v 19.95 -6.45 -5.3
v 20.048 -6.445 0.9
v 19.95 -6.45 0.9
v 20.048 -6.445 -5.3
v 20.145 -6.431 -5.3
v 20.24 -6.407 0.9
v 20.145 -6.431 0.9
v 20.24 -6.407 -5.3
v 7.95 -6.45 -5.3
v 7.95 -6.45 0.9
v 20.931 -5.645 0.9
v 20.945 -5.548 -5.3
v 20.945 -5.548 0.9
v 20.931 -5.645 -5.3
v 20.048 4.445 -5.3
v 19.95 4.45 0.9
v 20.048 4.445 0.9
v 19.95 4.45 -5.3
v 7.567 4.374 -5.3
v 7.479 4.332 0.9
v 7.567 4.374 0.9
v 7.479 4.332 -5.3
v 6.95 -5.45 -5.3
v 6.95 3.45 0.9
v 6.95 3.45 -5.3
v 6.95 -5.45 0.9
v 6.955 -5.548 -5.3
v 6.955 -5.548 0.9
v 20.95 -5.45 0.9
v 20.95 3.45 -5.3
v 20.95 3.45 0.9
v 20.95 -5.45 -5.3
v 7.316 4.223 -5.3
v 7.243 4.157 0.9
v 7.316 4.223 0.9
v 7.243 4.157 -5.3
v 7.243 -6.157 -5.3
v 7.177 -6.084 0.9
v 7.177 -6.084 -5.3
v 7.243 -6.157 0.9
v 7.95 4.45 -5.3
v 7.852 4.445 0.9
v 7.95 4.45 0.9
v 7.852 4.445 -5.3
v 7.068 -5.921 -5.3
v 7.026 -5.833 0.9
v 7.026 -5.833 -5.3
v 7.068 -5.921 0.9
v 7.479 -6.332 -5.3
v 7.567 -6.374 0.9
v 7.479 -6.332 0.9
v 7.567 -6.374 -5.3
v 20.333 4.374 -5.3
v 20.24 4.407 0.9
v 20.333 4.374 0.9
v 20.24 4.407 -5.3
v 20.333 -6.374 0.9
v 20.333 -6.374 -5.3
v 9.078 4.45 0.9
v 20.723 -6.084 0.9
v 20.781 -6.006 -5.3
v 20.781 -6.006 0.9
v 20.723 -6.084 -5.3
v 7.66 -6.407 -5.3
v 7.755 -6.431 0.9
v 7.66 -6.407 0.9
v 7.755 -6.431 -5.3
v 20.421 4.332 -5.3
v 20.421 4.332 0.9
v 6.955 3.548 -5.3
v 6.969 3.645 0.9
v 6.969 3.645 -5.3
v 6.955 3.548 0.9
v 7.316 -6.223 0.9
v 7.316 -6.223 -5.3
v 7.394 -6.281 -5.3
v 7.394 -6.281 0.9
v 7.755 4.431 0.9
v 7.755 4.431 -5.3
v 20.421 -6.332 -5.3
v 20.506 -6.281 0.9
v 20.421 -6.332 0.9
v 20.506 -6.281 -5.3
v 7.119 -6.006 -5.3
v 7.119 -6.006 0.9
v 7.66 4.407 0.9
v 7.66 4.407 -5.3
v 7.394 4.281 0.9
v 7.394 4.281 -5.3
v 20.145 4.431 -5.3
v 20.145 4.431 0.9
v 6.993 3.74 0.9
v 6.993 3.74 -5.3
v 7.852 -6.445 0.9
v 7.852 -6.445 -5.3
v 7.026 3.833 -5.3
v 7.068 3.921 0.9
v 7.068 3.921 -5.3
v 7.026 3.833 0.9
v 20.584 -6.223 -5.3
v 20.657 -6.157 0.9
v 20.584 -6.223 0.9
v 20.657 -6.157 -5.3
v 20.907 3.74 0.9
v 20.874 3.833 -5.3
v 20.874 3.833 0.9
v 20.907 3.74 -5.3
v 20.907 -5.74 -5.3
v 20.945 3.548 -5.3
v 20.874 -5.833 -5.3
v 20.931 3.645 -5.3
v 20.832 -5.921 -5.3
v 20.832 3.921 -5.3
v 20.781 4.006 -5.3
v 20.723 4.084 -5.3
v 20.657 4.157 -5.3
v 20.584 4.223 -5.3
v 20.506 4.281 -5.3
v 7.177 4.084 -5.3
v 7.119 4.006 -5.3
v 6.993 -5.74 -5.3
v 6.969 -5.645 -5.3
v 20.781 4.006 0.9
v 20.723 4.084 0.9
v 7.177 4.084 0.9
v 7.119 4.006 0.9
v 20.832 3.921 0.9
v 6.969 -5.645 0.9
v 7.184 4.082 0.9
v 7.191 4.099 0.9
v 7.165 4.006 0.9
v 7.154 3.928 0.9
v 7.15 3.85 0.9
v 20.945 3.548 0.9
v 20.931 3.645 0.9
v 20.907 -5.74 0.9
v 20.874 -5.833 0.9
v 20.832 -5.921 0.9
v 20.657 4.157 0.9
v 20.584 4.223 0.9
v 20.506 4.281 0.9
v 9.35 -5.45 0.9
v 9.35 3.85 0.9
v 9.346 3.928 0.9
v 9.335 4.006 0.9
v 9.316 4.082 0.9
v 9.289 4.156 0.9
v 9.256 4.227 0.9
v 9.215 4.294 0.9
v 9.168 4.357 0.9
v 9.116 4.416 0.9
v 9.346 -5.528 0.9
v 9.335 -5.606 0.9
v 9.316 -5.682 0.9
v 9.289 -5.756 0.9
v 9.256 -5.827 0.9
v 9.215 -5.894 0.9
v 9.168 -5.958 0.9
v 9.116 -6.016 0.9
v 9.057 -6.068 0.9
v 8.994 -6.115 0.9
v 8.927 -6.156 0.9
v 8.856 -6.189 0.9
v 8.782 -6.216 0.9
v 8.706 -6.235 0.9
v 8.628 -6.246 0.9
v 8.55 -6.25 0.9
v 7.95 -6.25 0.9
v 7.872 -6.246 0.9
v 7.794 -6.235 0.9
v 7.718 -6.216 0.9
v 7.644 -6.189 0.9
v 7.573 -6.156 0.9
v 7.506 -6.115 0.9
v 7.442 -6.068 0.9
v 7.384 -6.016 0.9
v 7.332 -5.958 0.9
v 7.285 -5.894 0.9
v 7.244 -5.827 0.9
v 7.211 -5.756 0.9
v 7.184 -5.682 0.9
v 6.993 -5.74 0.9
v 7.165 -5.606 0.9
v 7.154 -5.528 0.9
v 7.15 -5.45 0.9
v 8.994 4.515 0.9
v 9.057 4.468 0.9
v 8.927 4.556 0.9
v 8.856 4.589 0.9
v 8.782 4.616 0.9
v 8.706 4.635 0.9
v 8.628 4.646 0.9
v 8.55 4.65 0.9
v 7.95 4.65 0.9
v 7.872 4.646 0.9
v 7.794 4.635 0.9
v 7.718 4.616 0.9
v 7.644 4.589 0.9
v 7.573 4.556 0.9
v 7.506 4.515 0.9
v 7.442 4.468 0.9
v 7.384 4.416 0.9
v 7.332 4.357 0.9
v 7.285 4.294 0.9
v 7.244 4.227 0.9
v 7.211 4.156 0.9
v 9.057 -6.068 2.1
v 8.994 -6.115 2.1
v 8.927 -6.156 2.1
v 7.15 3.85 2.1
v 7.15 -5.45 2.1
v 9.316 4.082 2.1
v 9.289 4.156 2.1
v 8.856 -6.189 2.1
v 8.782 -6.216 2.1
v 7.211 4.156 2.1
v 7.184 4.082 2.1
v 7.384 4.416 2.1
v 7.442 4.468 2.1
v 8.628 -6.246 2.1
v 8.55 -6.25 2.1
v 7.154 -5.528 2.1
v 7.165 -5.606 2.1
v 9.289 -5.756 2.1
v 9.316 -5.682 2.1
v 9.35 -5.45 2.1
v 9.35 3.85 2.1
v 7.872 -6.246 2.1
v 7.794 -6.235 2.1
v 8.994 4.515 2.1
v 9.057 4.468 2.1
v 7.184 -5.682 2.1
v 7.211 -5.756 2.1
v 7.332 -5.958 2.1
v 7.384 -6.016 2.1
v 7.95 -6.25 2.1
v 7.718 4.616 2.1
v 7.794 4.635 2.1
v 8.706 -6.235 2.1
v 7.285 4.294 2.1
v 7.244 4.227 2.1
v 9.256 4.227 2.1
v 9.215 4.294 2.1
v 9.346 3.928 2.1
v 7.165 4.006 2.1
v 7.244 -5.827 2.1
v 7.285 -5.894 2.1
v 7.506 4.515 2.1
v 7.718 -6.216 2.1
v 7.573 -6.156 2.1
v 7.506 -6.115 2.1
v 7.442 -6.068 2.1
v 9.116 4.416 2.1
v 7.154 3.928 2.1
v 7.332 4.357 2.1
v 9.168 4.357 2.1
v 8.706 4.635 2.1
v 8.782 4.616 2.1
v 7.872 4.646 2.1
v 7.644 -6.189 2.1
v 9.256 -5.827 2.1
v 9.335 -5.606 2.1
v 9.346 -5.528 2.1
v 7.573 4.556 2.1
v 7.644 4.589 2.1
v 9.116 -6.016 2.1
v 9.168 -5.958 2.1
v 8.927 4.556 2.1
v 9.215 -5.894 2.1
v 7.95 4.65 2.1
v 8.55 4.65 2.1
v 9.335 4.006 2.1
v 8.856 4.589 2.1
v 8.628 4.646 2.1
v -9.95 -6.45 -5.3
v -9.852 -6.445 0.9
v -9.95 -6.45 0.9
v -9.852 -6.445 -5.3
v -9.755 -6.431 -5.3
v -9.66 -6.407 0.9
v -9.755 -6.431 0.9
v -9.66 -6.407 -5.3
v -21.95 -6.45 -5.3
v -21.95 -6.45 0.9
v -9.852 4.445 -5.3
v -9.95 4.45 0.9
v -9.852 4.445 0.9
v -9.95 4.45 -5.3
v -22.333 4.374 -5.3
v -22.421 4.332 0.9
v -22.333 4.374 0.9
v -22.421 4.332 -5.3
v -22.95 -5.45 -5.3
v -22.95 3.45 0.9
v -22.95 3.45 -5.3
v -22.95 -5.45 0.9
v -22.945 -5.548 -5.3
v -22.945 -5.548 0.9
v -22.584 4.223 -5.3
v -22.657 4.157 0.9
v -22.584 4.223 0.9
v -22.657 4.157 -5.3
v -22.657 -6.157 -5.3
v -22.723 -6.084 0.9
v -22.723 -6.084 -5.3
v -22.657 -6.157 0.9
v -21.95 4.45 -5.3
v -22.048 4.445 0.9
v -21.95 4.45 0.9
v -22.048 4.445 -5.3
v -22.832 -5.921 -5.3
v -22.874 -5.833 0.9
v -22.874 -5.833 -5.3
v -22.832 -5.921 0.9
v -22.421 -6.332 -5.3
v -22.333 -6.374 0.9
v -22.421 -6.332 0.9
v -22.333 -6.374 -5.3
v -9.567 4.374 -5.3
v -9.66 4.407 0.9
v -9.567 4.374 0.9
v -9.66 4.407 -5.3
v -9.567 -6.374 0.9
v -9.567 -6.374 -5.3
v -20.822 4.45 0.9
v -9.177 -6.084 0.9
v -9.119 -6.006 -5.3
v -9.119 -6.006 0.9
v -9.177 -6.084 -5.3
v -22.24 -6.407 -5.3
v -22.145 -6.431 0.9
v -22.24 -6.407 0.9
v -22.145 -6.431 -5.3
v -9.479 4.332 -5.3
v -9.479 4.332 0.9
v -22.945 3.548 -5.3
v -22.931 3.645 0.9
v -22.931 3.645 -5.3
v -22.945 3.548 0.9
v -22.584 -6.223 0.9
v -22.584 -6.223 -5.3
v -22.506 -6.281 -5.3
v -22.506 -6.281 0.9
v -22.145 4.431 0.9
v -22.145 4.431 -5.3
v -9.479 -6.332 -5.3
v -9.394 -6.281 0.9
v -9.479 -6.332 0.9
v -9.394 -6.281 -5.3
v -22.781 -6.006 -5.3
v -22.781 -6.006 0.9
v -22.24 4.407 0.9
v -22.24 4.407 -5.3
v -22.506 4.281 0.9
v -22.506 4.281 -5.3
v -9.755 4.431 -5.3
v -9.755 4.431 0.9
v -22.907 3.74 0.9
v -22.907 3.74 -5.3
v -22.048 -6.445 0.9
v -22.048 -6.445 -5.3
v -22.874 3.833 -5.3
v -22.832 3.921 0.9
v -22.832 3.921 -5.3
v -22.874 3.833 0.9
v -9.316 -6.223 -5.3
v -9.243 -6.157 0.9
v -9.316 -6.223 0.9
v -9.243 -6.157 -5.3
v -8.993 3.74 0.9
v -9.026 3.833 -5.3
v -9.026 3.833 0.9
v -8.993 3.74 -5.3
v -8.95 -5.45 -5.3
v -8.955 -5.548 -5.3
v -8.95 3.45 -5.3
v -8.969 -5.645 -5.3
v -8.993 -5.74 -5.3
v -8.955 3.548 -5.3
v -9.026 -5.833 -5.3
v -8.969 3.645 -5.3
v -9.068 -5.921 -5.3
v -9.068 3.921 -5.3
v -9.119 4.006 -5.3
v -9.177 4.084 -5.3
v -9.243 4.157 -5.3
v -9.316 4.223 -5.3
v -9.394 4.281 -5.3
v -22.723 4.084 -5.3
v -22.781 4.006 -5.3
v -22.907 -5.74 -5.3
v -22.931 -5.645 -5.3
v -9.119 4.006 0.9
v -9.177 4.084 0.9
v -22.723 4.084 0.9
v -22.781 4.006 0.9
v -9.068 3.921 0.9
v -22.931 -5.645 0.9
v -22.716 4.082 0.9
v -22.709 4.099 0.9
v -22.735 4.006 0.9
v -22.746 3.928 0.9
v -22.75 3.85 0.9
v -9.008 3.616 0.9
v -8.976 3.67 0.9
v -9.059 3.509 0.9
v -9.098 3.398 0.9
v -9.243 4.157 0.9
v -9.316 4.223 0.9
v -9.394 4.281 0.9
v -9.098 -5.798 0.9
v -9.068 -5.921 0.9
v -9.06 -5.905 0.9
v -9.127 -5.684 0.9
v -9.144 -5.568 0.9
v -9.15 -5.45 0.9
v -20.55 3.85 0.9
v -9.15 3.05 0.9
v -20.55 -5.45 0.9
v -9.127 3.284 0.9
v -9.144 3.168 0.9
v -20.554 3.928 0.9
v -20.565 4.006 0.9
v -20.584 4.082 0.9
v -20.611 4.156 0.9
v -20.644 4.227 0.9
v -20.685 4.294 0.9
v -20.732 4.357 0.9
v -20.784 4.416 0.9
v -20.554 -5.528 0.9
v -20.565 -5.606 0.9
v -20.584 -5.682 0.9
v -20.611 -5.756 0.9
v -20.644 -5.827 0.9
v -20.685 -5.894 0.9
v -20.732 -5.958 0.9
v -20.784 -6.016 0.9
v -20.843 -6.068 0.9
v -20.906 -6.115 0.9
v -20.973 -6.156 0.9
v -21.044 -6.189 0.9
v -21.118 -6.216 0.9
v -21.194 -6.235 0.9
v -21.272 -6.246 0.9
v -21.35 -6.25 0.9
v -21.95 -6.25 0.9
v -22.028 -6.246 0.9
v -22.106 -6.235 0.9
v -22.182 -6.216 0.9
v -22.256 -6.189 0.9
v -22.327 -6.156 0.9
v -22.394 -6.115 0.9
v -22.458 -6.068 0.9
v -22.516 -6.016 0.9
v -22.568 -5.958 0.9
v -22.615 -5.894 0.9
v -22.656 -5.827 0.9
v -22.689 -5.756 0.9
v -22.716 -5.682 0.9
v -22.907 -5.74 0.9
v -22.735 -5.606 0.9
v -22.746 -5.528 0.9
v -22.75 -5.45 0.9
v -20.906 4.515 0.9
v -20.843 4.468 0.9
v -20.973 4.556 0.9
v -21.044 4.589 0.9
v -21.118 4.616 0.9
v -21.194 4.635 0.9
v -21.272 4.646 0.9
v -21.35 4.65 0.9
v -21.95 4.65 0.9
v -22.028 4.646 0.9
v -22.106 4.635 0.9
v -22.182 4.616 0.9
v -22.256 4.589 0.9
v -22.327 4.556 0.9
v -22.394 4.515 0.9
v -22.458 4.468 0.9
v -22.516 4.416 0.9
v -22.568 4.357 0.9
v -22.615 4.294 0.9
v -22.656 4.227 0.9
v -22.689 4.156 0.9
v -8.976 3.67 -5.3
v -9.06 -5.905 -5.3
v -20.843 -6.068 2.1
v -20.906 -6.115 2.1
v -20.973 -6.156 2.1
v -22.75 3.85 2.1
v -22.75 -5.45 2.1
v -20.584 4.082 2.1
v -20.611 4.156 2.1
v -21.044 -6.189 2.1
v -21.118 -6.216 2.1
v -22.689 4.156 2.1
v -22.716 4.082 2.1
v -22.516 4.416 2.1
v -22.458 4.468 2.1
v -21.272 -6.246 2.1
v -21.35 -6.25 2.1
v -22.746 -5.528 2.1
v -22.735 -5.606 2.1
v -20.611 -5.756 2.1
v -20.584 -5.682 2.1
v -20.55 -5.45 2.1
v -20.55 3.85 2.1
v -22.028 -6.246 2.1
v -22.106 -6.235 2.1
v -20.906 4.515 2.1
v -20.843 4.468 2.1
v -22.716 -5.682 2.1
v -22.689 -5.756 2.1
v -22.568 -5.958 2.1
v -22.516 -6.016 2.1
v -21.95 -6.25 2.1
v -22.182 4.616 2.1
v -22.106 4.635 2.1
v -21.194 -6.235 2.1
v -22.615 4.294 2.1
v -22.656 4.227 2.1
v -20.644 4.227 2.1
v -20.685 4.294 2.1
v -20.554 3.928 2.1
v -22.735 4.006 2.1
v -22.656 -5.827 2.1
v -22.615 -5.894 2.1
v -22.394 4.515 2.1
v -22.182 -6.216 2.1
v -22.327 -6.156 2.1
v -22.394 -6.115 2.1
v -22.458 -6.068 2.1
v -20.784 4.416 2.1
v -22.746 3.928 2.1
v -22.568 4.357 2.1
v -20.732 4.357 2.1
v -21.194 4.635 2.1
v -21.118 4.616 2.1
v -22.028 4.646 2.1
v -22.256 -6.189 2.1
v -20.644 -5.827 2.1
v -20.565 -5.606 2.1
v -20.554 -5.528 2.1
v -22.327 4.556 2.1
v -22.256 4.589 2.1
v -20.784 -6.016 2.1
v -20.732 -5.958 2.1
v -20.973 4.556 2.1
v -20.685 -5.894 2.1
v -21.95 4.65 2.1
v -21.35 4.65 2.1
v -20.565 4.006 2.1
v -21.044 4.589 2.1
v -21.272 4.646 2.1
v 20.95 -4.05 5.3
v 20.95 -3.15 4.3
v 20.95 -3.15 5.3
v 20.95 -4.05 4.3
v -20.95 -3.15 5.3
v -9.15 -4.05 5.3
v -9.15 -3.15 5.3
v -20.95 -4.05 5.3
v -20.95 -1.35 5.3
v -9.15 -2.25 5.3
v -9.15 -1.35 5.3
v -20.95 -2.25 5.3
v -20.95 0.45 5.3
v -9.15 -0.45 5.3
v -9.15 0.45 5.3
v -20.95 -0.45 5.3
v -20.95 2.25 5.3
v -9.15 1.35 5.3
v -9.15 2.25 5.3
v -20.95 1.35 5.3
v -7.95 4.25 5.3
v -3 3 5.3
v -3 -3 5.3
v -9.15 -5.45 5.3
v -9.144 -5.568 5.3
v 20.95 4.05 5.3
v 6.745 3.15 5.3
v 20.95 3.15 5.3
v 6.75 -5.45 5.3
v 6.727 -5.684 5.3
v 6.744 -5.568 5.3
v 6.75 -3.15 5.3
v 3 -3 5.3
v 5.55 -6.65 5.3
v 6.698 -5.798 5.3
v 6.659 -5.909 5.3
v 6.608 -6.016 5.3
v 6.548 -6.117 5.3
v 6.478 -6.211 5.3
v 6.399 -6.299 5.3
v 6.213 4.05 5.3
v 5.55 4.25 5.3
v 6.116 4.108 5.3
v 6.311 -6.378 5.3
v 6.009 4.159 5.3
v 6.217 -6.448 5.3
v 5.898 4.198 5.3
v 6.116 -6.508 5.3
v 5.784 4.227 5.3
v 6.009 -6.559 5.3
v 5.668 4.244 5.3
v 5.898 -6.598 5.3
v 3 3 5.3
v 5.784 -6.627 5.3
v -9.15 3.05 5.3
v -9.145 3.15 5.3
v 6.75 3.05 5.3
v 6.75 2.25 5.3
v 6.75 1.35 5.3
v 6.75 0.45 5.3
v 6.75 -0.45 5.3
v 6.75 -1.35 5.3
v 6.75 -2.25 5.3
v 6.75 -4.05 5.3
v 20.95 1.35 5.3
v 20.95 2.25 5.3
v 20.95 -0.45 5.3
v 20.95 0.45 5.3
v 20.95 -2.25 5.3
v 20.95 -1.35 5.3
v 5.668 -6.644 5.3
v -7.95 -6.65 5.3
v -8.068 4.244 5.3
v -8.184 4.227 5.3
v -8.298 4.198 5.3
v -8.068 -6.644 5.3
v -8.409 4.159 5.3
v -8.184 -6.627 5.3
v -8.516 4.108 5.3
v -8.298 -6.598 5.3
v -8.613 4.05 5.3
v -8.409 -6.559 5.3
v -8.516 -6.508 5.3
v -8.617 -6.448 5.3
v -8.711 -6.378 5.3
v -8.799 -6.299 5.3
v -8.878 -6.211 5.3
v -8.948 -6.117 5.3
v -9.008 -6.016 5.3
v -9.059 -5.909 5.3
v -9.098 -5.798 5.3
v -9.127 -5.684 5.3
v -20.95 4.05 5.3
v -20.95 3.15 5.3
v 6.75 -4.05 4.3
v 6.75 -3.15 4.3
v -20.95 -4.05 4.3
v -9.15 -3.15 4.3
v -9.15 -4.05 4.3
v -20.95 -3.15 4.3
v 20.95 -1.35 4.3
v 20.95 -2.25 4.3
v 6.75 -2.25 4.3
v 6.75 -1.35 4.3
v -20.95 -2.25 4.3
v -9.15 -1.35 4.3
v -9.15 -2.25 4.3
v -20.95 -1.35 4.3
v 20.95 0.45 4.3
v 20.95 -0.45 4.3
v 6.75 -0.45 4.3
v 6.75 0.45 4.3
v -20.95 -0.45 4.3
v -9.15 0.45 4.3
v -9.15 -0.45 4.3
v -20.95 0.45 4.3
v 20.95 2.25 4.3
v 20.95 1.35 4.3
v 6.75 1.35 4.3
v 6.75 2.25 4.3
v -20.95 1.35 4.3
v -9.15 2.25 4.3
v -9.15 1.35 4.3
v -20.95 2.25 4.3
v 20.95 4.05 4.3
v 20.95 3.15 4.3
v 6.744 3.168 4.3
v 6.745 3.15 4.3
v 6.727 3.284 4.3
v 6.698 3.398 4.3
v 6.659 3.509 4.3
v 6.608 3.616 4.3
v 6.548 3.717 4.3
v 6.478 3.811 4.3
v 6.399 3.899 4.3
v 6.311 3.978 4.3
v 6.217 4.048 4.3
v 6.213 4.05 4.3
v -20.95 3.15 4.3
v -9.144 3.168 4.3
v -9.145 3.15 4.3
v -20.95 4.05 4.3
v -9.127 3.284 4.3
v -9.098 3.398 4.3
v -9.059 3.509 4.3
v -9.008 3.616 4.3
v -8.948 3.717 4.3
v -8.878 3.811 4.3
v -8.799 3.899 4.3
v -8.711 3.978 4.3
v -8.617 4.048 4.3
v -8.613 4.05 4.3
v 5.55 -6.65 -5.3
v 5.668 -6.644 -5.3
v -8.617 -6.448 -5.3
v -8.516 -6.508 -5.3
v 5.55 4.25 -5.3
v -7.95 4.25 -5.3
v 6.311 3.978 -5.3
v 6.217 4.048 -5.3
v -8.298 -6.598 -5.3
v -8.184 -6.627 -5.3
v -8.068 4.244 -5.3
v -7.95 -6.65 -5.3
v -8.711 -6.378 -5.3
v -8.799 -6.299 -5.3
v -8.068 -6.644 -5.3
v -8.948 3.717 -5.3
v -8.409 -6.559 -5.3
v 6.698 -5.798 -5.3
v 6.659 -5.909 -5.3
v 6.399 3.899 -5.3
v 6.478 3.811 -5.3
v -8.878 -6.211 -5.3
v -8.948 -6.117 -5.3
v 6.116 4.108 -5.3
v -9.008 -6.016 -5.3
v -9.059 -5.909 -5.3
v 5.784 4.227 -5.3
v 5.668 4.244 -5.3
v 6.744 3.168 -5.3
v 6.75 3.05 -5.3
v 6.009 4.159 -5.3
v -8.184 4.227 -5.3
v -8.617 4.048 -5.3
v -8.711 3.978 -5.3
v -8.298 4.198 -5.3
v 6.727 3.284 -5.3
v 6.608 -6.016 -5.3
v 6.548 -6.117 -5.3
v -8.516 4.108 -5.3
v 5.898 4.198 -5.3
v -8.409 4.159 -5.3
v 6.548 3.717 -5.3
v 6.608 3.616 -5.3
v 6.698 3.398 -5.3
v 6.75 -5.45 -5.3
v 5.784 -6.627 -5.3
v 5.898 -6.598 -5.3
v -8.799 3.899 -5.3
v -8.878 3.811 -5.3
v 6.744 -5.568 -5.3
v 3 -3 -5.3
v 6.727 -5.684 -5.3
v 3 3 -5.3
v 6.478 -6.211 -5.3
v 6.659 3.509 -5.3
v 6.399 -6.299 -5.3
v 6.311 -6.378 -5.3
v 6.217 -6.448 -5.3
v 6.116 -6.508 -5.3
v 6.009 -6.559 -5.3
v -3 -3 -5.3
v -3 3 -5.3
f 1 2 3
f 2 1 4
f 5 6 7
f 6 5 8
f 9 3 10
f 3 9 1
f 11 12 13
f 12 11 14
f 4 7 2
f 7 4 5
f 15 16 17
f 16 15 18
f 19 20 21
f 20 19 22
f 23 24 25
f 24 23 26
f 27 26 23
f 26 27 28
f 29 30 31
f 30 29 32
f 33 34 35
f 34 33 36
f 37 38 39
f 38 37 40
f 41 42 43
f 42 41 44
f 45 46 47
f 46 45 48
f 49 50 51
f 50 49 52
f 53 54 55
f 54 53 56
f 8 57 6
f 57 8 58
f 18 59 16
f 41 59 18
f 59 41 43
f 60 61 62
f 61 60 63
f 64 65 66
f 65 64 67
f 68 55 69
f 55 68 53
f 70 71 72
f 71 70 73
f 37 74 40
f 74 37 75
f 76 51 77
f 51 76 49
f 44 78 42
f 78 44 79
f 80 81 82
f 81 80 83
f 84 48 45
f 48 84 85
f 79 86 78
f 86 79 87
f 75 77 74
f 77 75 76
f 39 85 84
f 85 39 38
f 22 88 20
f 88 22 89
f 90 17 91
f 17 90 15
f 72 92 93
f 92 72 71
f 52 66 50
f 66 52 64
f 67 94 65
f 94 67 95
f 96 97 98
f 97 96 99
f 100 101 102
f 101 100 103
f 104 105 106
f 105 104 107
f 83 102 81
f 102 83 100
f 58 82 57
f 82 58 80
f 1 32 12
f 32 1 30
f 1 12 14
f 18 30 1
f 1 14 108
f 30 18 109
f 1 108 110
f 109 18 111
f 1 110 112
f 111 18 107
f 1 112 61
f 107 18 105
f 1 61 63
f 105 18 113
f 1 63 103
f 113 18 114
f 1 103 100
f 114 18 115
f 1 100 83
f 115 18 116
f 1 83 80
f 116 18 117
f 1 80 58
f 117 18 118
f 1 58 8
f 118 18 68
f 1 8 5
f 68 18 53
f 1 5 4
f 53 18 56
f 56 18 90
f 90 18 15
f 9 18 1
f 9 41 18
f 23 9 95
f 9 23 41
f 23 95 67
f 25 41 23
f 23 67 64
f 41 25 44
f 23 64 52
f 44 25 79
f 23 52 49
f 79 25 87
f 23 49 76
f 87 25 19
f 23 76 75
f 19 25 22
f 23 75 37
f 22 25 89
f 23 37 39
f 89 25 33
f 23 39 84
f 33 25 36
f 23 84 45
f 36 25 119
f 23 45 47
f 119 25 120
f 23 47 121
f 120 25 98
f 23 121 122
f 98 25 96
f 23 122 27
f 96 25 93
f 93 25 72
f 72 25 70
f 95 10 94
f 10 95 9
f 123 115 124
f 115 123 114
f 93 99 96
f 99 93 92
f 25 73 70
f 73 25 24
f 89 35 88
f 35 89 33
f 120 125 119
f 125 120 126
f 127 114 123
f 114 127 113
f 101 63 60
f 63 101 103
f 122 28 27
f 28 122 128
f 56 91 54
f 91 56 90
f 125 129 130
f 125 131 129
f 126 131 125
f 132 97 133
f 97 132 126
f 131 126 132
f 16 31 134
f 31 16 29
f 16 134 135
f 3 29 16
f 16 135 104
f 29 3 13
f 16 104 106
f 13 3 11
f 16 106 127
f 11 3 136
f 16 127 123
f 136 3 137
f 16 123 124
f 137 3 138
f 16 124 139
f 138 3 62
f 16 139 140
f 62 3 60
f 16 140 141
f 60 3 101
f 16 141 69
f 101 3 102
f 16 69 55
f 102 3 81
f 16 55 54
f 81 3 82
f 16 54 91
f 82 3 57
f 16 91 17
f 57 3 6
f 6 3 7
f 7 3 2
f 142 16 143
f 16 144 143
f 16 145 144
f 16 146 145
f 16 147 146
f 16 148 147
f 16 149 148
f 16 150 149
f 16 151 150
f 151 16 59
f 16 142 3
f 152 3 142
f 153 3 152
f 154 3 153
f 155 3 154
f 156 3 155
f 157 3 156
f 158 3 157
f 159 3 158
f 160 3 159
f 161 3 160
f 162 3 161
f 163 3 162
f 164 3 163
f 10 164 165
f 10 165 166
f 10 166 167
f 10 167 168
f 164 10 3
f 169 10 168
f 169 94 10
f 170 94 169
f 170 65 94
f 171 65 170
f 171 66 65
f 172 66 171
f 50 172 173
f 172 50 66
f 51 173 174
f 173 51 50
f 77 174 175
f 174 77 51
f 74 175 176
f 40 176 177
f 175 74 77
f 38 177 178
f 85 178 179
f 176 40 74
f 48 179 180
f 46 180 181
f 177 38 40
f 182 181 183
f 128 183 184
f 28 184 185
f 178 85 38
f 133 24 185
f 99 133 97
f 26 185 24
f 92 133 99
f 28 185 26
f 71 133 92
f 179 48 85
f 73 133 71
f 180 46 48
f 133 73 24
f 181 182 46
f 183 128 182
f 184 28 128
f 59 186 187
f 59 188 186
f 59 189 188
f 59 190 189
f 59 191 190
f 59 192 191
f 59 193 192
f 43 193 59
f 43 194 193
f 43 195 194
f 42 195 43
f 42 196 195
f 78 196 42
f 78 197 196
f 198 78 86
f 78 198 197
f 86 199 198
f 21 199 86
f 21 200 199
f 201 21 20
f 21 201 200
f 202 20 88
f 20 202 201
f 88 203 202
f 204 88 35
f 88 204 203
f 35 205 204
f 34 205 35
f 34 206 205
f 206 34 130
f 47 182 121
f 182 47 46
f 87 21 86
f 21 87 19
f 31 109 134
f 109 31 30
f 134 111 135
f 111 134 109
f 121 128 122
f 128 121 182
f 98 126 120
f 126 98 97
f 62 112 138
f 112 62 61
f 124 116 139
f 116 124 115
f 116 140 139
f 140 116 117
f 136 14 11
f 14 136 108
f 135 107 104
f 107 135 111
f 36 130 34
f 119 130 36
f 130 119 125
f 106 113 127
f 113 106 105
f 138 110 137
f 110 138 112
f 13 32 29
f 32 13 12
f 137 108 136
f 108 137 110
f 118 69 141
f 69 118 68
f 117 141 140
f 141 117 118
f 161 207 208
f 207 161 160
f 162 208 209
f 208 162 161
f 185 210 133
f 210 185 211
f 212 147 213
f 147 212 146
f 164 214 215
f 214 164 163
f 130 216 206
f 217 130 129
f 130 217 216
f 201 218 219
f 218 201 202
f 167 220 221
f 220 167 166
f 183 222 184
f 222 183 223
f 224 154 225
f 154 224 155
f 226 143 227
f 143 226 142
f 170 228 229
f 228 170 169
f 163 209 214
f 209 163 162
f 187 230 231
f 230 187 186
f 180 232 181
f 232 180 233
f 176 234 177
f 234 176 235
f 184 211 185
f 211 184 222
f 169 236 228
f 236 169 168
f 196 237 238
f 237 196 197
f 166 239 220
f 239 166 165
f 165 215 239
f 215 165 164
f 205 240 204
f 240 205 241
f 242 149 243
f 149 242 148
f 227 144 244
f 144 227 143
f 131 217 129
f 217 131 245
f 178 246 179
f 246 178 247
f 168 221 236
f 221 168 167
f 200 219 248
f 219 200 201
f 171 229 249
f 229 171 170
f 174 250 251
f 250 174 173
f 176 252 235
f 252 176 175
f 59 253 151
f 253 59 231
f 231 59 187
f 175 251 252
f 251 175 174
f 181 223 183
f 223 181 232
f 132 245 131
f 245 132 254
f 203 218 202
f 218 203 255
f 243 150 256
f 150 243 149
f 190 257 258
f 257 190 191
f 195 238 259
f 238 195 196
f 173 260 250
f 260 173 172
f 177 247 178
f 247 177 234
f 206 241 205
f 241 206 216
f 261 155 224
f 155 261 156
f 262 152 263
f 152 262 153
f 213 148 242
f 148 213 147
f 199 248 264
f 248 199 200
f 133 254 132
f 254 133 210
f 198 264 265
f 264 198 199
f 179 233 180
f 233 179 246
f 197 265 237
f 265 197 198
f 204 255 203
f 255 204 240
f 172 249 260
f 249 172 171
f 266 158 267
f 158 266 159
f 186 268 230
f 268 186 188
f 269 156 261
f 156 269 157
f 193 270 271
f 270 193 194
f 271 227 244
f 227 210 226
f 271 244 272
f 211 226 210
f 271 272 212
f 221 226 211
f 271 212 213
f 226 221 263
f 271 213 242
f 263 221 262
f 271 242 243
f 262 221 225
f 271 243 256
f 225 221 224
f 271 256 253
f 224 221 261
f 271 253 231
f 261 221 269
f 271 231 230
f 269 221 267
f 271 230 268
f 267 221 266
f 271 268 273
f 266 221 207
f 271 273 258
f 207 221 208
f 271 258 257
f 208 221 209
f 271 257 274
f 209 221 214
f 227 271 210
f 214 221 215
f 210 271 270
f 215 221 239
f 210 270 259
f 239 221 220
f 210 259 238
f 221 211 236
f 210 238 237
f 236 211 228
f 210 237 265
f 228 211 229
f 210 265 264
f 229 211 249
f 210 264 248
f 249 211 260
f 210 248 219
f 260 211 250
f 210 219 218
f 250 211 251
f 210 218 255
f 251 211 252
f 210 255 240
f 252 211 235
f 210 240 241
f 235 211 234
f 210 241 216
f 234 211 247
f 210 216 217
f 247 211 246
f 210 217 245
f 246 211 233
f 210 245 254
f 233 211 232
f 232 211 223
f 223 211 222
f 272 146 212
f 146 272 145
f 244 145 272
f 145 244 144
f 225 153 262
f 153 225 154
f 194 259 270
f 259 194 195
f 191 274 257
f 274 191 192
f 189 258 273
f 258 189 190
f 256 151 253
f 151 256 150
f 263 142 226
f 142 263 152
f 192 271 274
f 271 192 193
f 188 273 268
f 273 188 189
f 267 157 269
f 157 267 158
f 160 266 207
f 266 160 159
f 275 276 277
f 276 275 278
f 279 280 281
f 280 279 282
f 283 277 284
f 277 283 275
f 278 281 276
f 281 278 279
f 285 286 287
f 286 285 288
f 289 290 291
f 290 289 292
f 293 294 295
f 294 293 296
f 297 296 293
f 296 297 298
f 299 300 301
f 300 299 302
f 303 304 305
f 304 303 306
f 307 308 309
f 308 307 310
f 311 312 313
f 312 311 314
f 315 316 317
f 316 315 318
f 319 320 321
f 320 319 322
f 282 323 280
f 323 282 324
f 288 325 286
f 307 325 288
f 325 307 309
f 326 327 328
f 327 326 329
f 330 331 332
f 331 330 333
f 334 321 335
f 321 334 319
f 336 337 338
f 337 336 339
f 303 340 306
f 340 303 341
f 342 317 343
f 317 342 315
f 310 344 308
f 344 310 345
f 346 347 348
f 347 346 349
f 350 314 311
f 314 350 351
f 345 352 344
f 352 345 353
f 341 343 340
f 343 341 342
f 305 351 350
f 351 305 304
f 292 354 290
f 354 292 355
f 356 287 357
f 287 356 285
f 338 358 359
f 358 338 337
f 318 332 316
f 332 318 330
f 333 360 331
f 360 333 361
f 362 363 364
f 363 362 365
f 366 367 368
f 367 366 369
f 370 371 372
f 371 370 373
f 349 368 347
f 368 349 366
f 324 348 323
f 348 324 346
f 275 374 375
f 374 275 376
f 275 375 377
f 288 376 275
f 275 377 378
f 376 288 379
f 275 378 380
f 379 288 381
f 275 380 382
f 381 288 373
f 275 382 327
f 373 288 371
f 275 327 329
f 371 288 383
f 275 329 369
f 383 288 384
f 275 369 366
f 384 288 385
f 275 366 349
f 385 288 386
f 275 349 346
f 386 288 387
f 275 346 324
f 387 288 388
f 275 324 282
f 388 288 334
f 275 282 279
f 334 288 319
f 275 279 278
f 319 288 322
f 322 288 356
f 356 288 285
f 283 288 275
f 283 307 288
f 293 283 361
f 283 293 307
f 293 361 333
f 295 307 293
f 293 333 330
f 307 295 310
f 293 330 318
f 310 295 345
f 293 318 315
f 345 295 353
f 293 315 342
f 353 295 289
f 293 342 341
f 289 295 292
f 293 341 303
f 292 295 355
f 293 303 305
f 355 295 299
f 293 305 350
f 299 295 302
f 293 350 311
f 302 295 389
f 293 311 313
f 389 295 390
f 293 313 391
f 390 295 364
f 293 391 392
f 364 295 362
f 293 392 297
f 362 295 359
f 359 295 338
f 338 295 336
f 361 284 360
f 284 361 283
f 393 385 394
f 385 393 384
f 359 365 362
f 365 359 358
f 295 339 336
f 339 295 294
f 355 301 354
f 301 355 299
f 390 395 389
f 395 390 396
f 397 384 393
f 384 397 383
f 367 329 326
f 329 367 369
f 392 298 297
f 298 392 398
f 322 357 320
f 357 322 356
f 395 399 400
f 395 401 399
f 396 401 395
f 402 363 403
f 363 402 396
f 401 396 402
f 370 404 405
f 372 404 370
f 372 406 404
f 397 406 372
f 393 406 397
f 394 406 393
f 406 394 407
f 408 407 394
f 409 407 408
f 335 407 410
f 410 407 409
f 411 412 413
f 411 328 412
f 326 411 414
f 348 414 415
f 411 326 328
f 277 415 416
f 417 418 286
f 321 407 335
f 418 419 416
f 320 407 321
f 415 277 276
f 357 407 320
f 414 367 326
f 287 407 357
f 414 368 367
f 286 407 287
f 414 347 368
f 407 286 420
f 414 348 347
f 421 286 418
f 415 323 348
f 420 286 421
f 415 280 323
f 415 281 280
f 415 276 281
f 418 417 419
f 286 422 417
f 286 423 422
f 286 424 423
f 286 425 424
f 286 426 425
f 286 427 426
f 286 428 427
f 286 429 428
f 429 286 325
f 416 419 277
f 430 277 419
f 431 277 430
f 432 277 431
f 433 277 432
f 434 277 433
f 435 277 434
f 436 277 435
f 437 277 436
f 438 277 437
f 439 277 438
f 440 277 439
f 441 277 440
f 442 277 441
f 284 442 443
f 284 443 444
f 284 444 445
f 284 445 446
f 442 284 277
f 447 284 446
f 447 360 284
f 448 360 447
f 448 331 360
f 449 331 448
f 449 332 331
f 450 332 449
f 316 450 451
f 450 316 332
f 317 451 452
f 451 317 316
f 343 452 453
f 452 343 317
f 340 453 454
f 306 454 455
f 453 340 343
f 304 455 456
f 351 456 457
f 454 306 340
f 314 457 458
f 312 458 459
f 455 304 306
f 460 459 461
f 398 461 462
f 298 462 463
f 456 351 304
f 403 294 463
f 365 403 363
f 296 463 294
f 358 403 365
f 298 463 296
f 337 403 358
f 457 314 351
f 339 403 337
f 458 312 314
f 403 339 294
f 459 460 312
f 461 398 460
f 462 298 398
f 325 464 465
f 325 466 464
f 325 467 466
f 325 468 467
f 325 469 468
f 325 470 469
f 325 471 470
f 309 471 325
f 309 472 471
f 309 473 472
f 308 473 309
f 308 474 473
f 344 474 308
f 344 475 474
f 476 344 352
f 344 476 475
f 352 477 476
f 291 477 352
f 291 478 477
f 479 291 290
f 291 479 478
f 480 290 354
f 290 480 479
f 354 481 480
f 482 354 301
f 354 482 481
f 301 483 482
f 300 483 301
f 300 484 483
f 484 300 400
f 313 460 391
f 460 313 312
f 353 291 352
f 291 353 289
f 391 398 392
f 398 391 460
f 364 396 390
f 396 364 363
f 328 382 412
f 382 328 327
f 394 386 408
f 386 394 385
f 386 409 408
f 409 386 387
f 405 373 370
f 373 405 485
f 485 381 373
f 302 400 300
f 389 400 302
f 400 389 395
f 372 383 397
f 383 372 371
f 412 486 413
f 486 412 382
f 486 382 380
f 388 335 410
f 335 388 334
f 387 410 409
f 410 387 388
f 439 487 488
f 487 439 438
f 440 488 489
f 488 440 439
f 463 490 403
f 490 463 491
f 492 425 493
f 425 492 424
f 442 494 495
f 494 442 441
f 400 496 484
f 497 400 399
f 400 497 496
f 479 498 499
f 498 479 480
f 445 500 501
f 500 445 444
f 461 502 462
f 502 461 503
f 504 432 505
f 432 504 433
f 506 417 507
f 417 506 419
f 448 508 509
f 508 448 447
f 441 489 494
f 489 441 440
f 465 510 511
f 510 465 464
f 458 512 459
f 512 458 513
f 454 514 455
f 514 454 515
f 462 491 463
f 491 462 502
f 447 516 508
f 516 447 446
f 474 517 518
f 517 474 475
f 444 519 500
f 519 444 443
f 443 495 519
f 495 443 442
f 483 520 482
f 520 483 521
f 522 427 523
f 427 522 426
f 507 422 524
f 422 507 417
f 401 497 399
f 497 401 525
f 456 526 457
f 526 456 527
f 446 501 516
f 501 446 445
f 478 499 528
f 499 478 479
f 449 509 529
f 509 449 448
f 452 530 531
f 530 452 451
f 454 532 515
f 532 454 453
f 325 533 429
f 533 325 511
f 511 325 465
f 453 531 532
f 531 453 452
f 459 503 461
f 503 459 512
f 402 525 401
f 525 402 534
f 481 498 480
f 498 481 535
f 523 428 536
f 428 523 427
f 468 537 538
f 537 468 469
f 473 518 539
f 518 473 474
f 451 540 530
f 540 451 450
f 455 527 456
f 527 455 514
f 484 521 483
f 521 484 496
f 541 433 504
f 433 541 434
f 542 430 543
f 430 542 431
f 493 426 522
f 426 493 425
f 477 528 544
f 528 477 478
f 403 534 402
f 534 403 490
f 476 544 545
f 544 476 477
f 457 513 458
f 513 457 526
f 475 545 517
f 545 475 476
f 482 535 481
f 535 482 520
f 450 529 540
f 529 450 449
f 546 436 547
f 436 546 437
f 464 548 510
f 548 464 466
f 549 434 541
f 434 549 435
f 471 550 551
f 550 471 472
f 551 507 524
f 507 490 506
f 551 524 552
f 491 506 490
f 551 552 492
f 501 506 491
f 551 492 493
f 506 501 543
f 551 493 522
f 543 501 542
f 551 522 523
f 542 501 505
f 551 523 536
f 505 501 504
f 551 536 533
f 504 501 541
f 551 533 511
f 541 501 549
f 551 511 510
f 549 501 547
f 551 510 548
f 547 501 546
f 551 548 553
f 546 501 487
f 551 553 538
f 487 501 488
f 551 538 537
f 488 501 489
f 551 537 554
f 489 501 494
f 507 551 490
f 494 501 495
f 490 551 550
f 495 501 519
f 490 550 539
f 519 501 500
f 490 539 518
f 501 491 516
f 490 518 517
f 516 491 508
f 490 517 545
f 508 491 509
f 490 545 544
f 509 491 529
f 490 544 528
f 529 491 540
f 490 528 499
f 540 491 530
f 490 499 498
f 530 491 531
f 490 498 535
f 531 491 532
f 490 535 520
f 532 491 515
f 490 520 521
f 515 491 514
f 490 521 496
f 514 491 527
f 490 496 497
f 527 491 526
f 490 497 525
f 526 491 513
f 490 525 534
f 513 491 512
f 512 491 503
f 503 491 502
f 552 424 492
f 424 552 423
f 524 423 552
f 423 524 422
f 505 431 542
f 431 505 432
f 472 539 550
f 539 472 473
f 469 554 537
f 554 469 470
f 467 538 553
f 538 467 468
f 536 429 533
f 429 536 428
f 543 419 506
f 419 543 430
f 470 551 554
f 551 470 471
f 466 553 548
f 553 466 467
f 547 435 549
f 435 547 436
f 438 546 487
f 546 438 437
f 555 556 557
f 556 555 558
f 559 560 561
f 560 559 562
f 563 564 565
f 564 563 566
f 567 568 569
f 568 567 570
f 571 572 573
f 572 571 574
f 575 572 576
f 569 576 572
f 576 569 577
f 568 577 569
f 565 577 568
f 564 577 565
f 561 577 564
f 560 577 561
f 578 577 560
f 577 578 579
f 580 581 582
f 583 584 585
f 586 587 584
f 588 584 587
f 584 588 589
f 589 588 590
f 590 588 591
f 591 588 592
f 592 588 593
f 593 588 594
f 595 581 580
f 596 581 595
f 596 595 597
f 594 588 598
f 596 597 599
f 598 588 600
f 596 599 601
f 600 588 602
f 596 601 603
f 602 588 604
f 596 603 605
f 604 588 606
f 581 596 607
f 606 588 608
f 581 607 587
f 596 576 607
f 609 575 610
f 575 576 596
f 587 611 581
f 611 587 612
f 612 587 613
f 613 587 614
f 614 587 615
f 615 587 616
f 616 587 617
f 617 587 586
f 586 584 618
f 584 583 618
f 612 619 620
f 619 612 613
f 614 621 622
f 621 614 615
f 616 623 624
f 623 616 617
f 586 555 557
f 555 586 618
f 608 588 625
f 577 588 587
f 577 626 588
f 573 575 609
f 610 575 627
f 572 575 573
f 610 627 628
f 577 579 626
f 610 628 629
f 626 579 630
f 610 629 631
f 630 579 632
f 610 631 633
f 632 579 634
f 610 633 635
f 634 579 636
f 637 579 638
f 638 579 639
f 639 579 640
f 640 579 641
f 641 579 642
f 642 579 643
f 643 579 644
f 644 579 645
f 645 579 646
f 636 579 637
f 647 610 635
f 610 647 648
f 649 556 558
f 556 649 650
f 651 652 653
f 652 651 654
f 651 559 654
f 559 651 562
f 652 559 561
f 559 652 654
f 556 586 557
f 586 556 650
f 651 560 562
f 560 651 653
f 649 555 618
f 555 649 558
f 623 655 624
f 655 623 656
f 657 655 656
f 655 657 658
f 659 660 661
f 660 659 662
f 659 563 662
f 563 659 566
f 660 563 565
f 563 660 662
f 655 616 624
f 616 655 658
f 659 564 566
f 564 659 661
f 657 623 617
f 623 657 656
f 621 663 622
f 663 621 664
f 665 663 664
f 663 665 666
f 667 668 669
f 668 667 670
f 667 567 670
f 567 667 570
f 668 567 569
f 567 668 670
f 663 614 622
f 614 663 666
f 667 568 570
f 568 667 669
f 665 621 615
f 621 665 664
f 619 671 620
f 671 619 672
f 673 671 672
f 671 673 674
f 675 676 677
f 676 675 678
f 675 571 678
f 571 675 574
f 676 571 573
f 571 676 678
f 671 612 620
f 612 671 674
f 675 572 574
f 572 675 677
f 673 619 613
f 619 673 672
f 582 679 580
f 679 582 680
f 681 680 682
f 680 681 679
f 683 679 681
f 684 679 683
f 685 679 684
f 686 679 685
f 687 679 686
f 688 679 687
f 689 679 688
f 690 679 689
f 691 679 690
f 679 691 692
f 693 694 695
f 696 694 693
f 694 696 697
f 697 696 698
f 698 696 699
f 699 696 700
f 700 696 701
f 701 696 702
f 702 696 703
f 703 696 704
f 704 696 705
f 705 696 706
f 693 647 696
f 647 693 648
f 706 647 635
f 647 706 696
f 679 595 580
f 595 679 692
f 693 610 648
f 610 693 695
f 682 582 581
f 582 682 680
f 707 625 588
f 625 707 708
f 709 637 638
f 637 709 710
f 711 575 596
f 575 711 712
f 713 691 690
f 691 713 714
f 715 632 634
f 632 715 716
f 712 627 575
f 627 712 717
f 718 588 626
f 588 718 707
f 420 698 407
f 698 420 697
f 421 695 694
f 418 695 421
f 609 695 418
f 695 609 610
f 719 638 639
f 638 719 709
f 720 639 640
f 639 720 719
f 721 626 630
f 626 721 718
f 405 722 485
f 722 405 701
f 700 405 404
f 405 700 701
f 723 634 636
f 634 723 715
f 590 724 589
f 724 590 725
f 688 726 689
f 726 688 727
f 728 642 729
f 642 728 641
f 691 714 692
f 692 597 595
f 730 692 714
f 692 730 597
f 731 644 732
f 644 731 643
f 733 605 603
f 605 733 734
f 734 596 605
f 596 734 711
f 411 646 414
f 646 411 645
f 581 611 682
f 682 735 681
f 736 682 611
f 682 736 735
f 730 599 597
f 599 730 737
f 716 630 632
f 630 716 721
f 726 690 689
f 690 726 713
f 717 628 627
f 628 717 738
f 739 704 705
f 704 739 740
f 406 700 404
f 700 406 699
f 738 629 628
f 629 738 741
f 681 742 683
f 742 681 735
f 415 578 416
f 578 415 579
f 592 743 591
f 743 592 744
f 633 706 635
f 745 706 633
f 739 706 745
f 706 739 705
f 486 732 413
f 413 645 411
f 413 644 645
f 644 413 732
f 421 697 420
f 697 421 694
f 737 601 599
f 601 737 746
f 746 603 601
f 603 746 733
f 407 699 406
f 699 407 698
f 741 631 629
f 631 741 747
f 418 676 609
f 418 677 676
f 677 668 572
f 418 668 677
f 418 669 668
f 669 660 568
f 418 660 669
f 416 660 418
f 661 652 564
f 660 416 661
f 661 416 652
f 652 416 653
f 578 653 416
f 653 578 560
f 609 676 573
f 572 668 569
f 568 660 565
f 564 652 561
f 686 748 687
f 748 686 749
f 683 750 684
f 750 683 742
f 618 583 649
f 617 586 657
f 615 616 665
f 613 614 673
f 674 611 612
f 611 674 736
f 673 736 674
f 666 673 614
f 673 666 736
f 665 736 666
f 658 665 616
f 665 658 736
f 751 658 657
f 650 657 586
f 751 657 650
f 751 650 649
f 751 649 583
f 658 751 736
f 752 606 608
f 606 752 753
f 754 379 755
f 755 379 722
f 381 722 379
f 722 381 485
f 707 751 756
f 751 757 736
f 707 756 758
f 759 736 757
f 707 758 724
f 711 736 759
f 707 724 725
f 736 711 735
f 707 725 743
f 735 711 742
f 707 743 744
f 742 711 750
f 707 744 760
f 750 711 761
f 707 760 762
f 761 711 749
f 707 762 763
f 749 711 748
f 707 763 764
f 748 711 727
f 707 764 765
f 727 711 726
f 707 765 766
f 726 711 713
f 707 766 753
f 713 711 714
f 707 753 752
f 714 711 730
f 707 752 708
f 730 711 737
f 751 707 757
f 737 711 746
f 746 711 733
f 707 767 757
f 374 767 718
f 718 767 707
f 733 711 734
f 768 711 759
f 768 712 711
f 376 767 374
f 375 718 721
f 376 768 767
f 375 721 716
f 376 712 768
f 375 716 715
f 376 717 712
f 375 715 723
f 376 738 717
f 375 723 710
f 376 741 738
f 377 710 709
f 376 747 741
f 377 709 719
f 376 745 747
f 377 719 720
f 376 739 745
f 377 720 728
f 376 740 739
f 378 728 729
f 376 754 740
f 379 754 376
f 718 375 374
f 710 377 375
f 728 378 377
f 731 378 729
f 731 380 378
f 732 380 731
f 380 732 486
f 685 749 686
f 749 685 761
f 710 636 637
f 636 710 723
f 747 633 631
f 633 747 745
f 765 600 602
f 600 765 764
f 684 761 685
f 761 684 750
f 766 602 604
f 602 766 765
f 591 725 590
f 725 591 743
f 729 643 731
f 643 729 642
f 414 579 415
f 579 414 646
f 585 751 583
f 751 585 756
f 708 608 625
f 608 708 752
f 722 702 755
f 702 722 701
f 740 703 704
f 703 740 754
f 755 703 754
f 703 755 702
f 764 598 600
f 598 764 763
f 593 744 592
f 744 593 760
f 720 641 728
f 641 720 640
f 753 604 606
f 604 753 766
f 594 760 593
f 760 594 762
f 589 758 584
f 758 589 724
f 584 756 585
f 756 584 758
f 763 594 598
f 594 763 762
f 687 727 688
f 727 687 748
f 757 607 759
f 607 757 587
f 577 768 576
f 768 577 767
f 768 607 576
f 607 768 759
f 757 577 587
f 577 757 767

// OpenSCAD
$fn=64;

L = 43.9;
W = 10.9;
H = 10.6;

module rounded_box(size=[10,10,10], r=1.0, center=true){
    sx=size[0]; sy=size[1]; sz=size[2];
    rr = min(r, sx/2, sy/2);
    translate(center ? [-sx/2,-sy/2,-sz/2] : [0,0,0])
    linear_extrude(height=sz)
        offset(r=rr)
            square([sx-2*rr, sy-2*rr], center=false);
}

module rib(len=10, w=1.0, h=1.0, z0=0){
    translate([-len/2, -w/2, z0])
        cube([len, w, h], center=false);
}

module arm_with_step(arm_len=14.0, arm_w=W, arm_h=6.2, step_len=2.2, step_h=1.2, fillet_r=1.0){
    union(){
        rounded_box([arm_len, arm_w, arm_h], r=fillet_r, center=true);
        translate([-(arm_len/2 - step_len/2), 0, (arm_h/2 + step_h/2)])
            rounded_box([step_len, arm_w, step_h], r=fillet_r*0.8, center=true);
    }
}

module central_block(block_len=15.9, block_w=W, block_h=H, fillet_r=1.2){
    rounded_box([block_len, block_w, block_h], r=fillet_r, center=true);
}

module bracket(){
    block_len = 15.9;
    arm_len = (L - block_len)/2;
    arm_h = 6.2;
    step_len = 2.2;
    step_h = 1.2;

    difference(){
        union(){
            central_block(block_len=block_len, block_w=W, block_h=H, fillet_r=1.2);

            translate([ (block_len/2 + arm_len/2), 0, -(H/2 - arm_h/2)])
                arm_with_step(arm_len=arm_len, arm_w=W, arm_h=arm_h, step_len=step_len, step_h=step_h, fillet_r=1.0);

            translate([-(block_len/2 + arm_len/2), 0, -(H/2 - arm_h/2)])
                arm_with_step(arm_len=arm_len, arm_w=W, arm_h=arm_h, step_len=step_len, step_h=step_h, fillet_r=1.0);

            rib_len = L - 2.0;
            rib_h = 1.0;
            rib_w = 0.9;
            z_rib = H/2 - rib_h;

            for (ypos = [-3.6, -1.8, 0, 1.8, 3.6])
                translate([0, ypos, 0])
                    rib(len=rib_len, w=rib_w, h=rib_h, z0=z_rib);
        }

        win = 6.0;
        translate([0,0,0])
            cube([win, win, H+0.6], center=true);
    }
}

bracket();
